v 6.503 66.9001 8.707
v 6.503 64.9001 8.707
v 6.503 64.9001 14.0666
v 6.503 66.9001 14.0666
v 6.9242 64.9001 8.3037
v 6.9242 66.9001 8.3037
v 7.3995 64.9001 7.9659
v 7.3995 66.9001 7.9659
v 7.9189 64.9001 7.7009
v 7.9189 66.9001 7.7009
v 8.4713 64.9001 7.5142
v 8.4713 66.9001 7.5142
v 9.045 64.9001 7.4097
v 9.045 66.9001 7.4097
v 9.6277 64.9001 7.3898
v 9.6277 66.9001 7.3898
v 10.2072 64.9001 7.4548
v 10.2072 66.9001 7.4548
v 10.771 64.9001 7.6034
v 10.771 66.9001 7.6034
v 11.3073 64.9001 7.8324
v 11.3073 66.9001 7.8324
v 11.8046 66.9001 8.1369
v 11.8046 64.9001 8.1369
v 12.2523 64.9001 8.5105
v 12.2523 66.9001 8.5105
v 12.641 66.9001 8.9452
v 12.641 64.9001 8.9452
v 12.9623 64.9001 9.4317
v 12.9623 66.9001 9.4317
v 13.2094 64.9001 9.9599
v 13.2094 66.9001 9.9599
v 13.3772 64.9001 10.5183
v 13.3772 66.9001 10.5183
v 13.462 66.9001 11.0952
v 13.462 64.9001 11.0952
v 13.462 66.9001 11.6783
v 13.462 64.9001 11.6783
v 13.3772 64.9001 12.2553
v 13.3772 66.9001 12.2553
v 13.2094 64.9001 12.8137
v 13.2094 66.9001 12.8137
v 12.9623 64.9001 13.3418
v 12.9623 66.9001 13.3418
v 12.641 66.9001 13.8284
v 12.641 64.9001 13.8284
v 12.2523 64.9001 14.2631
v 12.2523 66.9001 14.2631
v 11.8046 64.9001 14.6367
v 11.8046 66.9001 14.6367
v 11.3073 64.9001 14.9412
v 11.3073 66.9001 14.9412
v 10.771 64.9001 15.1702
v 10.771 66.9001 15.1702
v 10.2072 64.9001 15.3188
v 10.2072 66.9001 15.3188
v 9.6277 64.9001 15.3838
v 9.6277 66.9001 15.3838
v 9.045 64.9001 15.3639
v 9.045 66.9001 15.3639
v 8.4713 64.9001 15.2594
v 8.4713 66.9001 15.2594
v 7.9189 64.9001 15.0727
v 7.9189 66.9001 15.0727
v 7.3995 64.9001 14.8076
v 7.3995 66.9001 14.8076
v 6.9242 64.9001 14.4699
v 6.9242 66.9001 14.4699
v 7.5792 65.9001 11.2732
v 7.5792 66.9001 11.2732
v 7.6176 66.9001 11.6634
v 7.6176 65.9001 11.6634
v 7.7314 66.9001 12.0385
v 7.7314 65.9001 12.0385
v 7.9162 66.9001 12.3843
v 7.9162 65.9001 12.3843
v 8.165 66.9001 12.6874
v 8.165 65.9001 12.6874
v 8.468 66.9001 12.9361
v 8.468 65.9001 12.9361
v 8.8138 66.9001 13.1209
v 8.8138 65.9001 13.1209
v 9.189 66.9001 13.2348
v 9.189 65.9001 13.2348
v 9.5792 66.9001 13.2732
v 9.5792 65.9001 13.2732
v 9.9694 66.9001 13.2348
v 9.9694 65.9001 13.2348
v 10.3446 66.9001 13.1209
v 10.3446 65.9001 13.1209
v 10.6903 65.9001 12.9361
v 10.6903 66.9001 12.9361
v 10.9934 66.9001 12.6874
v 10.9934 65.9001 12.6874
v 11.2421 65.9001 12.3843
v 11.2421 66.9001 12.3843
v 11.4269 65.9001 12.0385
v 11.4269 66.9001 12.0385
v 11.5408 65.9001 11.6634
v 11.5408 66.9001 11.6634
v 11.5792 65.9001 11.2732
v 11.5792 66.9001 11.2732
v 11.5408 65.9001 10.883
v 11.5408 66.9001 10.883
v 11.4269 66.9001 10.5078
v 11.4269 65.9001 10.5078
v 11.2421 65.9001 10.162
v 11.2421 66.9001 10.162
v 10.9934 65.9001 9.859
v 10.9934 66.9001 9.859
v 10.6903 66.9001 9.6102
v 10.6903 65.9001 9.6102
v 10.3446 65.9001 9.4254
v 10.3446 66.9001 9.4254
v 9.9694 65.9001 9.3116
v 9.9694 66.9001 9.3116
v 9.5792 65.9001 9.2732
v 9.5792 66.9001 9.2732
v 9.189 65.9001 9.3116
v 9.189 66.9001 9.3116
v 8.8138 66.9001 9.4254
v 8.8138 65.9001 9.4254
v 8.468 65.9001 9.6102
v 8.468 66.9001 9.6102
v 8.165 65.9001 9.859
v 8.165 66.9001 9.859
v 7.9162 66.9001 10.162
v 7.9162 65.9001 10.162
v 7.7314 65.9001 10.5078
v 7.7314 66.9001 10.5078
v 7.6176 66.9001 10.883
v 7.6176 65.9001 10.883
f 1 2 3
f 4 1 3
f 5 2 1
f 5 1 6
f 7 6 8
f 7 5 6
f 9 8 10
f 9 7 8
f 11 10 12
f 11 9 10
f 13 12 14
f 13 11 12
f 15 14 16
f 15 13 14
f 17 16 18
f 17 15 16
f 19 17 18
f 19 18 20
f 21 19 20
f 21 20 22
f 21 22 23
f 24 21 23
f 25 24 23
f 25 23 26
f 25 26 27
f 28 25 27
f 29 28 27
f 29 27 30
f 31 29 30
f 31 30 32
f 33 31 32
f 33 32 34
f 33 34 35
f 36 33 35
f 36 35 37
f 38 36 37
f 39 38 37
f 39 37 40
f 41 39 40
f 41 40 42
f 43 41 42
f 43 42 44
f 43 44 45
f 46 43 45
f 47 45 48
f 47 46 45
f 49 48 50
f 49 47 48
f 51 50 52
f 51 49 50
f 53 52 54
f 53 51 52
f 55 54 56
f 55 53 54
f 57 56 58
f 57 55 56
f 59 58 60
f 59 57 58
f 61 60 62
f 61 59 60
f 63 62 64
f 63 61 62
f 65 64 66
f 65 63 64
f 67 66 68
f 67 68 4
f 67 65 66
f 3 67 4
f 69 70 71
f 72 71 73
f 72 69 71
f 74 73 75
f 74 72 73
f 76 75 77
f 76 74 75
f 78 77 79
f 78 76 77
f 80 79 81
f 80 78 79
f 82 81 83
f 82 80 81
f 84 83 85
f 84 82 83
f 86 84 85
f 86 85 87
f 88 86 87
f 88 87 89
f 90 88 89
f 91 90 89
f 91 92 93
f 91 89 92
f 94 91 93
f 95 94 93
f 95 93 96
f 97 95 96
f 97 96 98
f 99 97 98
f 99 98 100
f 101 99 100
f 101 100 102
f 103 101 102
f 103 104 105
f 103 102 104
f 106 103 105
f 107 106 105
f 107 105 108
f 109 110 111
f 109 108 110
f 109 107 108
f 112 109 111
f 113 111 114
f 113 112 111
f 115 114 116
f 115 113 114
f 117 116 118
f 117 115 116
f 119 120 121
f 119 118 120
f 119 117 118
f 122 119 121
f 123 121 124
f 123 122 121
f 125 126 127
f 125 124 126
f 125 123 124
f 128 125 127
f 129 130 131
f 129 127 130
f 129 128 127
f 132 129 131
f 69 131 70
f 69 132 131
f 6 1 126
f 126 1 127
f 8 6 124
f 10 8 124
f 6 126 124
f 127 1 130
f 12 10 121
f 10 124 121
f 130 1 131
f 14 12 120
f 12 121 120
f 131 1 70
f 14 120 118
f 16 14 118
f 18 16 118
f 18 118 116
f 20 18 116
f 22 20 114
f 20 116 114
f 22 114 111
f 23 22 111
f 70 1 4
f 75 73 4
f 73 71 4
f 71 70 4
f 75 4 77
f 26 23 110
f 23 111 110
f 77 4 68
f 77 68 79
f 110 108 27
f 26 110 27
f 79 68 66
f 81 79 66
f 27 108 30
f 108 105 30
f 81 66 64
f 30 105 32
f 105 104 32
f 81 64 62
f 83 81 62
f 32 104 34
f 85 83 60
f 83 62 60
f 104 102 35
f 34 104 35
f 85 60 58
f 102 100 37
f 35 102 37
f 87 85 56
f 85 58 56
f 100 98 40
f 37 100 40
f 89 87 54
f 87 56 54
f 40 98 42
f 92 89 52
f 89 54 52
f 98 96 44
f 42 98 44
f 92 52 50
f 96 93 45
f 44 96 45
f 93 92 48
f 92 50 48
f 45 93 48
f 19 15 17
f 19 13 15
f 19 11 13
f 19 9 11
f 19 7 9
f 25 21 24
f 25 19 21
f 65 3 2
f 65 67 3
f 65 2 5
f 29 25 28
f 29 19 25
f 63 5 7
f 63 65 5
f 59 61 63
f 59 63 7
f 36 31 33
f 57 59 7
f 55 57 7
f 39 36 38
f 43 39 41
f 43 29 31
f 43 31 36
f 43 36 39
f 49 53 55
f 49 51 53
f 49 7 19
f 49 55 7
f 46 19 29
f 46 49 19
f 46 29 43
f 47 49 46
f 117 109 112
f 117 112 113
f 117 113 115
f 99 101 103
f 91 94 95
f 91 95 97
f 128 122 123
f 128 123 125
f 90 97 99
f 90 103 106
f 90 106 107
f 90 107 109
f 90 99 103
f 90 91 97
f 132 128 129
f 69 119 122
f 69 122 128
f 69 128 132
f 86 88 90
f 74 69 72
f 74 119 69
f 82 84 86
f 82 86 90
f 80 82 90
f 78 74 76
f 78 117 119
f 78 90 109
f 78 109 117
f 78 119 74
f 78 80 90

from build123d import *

# Parameters (mm, degrees)
CIRCLE008_AS_DRAWN_R                      = 2
EXTRUDE015_DEPTH                          = 2
EXTRUDE015_ONTO_CIRCLE008_ROLL_ANGLE      = 90
EXTRUDE015_ONTO_CIRCLE008_PLACEMENT_ANGLE = 180
RECTANGLE005_AS_DRAWN_W                   = 5.41291
RECTANGLE005_AS_DRAWN_H                   = 8.044928
EXTRUDE010_DEPTH                          = 3
EXTRUDE010_ONTO_RECTANGLE005_ROLL_ANGLE   = 90
CIRCLE002_AS_DRAWN_R                      = 4
EXTRUDE009_DEPTH                          = 2
EXTRUDE009_ONTO_CIRCLE002_ROLL_ANGLE      = 90


with BuildPart() as extrude015:
    # Circle008 as drawn → Extrude015 (new)
    with BuildSketch(Plane.XY):
        Circle(CIRCLE008_AS_DRAWN_R)
    extrude(amount=EXTRUDE015_DEPTH)


with BuildPart() as extrude015_1:
    # Extrude015 onto Circle008 roll: moved
    add(extrude015.part.rotate(Axis((0, 0, 0), (1, 0, 0)), EXTRUDE015_ONTO_CIRCLE008_ROLL_ANGLE))


with BuildPart() as extrude015_2:
    # Extrude015 onto Circle008 placement: moved
    add(extrude015_1.part.moved(Location((9.579189, 64.900139, 11.27318))).rotate(Axis((9.579189, 64.900139, 11.27318), (0, 0, 1)), EXTRUDE015_ONTO_CIRCLE008_PLACEMENT_ANGLE))


with BuildPart() as extrude015_3:
    # Extrude015 placement: moved
    add(extrude015_2.part.moved(Location((0, 1, 0))))


with BuildPart() as extrude010:
    # Rectangle005 as drawn → Extrude010 (new)
    with BuildSketch(Plane.XY):
        with Locations((-2.706455, -4.022464)):
            Rectangle(RECTANGLE005_AS_DRAWN_W, RECTANGLE005_AS_DRAWN_H)
    extrude(amount=-EXTRUDE010_DEPTH)


with BuildPart() as extrude010_1:
    # Extrude010 onto Rectangle005 roll: moved
    add(extrude010.part.rotate(Axis((0, 0, 0), (1, 0, 0)), EXTRUDE010_ONTO_RECTANGLE005_ROLL_ANGLE))


with BuildPart() as extrude010_2:
    # Extrude010 onto Rectangle005 placement: moved
    add(extrude010_1.part.moved(Location((56.902615, 1.09014, 40.499655))))


with BuildPart() as extrude010_3:
    # Extrude010 placement: moved
    add(extrude010_2.part.moved(Location((0, -0.5, 0))))


with BuildPart() as partemotor2:
    # Circle002 as drawn → Extrude009 (new)
    with BuildSketch(Plane.XY):
        Circle(CIRCLE002_AS_DRAWN_R)
    extrude(amount=-EXTRUDE009_DEPTH)


with BuildPart() as partemotor2_1:
    # Extrude009 onto Circle002 roll: moved
    add(partemotor2.part.rotate(Axis((0, 0, 0), (1, 0, 0)), EXTRUDE009_ONTO_CIRCLE002_ROLL_ANGLE))


with BuildPart() as partemotor2_2:
    # Extrude009 onto Circle002 placement: moved
    add(partemotor2_1.part.moved(Location((59.872219, 1.090141, 36.55234))))

    # Cut: cut Extrude010
    add(extrude010_3.part, mode=Mode.SUBTRACT)


with BuildPart() as partemotor2_3:
    # Cut placement: moved
    add(partemotor2_2.part.moved(Location((-50.399612, 63.810001, -25.16555))))

    # Cut002: cut Extrude015
    add(extrude015_3.part, mode=Mode.SUBTRACT)


solid = partemotor2_3.part
